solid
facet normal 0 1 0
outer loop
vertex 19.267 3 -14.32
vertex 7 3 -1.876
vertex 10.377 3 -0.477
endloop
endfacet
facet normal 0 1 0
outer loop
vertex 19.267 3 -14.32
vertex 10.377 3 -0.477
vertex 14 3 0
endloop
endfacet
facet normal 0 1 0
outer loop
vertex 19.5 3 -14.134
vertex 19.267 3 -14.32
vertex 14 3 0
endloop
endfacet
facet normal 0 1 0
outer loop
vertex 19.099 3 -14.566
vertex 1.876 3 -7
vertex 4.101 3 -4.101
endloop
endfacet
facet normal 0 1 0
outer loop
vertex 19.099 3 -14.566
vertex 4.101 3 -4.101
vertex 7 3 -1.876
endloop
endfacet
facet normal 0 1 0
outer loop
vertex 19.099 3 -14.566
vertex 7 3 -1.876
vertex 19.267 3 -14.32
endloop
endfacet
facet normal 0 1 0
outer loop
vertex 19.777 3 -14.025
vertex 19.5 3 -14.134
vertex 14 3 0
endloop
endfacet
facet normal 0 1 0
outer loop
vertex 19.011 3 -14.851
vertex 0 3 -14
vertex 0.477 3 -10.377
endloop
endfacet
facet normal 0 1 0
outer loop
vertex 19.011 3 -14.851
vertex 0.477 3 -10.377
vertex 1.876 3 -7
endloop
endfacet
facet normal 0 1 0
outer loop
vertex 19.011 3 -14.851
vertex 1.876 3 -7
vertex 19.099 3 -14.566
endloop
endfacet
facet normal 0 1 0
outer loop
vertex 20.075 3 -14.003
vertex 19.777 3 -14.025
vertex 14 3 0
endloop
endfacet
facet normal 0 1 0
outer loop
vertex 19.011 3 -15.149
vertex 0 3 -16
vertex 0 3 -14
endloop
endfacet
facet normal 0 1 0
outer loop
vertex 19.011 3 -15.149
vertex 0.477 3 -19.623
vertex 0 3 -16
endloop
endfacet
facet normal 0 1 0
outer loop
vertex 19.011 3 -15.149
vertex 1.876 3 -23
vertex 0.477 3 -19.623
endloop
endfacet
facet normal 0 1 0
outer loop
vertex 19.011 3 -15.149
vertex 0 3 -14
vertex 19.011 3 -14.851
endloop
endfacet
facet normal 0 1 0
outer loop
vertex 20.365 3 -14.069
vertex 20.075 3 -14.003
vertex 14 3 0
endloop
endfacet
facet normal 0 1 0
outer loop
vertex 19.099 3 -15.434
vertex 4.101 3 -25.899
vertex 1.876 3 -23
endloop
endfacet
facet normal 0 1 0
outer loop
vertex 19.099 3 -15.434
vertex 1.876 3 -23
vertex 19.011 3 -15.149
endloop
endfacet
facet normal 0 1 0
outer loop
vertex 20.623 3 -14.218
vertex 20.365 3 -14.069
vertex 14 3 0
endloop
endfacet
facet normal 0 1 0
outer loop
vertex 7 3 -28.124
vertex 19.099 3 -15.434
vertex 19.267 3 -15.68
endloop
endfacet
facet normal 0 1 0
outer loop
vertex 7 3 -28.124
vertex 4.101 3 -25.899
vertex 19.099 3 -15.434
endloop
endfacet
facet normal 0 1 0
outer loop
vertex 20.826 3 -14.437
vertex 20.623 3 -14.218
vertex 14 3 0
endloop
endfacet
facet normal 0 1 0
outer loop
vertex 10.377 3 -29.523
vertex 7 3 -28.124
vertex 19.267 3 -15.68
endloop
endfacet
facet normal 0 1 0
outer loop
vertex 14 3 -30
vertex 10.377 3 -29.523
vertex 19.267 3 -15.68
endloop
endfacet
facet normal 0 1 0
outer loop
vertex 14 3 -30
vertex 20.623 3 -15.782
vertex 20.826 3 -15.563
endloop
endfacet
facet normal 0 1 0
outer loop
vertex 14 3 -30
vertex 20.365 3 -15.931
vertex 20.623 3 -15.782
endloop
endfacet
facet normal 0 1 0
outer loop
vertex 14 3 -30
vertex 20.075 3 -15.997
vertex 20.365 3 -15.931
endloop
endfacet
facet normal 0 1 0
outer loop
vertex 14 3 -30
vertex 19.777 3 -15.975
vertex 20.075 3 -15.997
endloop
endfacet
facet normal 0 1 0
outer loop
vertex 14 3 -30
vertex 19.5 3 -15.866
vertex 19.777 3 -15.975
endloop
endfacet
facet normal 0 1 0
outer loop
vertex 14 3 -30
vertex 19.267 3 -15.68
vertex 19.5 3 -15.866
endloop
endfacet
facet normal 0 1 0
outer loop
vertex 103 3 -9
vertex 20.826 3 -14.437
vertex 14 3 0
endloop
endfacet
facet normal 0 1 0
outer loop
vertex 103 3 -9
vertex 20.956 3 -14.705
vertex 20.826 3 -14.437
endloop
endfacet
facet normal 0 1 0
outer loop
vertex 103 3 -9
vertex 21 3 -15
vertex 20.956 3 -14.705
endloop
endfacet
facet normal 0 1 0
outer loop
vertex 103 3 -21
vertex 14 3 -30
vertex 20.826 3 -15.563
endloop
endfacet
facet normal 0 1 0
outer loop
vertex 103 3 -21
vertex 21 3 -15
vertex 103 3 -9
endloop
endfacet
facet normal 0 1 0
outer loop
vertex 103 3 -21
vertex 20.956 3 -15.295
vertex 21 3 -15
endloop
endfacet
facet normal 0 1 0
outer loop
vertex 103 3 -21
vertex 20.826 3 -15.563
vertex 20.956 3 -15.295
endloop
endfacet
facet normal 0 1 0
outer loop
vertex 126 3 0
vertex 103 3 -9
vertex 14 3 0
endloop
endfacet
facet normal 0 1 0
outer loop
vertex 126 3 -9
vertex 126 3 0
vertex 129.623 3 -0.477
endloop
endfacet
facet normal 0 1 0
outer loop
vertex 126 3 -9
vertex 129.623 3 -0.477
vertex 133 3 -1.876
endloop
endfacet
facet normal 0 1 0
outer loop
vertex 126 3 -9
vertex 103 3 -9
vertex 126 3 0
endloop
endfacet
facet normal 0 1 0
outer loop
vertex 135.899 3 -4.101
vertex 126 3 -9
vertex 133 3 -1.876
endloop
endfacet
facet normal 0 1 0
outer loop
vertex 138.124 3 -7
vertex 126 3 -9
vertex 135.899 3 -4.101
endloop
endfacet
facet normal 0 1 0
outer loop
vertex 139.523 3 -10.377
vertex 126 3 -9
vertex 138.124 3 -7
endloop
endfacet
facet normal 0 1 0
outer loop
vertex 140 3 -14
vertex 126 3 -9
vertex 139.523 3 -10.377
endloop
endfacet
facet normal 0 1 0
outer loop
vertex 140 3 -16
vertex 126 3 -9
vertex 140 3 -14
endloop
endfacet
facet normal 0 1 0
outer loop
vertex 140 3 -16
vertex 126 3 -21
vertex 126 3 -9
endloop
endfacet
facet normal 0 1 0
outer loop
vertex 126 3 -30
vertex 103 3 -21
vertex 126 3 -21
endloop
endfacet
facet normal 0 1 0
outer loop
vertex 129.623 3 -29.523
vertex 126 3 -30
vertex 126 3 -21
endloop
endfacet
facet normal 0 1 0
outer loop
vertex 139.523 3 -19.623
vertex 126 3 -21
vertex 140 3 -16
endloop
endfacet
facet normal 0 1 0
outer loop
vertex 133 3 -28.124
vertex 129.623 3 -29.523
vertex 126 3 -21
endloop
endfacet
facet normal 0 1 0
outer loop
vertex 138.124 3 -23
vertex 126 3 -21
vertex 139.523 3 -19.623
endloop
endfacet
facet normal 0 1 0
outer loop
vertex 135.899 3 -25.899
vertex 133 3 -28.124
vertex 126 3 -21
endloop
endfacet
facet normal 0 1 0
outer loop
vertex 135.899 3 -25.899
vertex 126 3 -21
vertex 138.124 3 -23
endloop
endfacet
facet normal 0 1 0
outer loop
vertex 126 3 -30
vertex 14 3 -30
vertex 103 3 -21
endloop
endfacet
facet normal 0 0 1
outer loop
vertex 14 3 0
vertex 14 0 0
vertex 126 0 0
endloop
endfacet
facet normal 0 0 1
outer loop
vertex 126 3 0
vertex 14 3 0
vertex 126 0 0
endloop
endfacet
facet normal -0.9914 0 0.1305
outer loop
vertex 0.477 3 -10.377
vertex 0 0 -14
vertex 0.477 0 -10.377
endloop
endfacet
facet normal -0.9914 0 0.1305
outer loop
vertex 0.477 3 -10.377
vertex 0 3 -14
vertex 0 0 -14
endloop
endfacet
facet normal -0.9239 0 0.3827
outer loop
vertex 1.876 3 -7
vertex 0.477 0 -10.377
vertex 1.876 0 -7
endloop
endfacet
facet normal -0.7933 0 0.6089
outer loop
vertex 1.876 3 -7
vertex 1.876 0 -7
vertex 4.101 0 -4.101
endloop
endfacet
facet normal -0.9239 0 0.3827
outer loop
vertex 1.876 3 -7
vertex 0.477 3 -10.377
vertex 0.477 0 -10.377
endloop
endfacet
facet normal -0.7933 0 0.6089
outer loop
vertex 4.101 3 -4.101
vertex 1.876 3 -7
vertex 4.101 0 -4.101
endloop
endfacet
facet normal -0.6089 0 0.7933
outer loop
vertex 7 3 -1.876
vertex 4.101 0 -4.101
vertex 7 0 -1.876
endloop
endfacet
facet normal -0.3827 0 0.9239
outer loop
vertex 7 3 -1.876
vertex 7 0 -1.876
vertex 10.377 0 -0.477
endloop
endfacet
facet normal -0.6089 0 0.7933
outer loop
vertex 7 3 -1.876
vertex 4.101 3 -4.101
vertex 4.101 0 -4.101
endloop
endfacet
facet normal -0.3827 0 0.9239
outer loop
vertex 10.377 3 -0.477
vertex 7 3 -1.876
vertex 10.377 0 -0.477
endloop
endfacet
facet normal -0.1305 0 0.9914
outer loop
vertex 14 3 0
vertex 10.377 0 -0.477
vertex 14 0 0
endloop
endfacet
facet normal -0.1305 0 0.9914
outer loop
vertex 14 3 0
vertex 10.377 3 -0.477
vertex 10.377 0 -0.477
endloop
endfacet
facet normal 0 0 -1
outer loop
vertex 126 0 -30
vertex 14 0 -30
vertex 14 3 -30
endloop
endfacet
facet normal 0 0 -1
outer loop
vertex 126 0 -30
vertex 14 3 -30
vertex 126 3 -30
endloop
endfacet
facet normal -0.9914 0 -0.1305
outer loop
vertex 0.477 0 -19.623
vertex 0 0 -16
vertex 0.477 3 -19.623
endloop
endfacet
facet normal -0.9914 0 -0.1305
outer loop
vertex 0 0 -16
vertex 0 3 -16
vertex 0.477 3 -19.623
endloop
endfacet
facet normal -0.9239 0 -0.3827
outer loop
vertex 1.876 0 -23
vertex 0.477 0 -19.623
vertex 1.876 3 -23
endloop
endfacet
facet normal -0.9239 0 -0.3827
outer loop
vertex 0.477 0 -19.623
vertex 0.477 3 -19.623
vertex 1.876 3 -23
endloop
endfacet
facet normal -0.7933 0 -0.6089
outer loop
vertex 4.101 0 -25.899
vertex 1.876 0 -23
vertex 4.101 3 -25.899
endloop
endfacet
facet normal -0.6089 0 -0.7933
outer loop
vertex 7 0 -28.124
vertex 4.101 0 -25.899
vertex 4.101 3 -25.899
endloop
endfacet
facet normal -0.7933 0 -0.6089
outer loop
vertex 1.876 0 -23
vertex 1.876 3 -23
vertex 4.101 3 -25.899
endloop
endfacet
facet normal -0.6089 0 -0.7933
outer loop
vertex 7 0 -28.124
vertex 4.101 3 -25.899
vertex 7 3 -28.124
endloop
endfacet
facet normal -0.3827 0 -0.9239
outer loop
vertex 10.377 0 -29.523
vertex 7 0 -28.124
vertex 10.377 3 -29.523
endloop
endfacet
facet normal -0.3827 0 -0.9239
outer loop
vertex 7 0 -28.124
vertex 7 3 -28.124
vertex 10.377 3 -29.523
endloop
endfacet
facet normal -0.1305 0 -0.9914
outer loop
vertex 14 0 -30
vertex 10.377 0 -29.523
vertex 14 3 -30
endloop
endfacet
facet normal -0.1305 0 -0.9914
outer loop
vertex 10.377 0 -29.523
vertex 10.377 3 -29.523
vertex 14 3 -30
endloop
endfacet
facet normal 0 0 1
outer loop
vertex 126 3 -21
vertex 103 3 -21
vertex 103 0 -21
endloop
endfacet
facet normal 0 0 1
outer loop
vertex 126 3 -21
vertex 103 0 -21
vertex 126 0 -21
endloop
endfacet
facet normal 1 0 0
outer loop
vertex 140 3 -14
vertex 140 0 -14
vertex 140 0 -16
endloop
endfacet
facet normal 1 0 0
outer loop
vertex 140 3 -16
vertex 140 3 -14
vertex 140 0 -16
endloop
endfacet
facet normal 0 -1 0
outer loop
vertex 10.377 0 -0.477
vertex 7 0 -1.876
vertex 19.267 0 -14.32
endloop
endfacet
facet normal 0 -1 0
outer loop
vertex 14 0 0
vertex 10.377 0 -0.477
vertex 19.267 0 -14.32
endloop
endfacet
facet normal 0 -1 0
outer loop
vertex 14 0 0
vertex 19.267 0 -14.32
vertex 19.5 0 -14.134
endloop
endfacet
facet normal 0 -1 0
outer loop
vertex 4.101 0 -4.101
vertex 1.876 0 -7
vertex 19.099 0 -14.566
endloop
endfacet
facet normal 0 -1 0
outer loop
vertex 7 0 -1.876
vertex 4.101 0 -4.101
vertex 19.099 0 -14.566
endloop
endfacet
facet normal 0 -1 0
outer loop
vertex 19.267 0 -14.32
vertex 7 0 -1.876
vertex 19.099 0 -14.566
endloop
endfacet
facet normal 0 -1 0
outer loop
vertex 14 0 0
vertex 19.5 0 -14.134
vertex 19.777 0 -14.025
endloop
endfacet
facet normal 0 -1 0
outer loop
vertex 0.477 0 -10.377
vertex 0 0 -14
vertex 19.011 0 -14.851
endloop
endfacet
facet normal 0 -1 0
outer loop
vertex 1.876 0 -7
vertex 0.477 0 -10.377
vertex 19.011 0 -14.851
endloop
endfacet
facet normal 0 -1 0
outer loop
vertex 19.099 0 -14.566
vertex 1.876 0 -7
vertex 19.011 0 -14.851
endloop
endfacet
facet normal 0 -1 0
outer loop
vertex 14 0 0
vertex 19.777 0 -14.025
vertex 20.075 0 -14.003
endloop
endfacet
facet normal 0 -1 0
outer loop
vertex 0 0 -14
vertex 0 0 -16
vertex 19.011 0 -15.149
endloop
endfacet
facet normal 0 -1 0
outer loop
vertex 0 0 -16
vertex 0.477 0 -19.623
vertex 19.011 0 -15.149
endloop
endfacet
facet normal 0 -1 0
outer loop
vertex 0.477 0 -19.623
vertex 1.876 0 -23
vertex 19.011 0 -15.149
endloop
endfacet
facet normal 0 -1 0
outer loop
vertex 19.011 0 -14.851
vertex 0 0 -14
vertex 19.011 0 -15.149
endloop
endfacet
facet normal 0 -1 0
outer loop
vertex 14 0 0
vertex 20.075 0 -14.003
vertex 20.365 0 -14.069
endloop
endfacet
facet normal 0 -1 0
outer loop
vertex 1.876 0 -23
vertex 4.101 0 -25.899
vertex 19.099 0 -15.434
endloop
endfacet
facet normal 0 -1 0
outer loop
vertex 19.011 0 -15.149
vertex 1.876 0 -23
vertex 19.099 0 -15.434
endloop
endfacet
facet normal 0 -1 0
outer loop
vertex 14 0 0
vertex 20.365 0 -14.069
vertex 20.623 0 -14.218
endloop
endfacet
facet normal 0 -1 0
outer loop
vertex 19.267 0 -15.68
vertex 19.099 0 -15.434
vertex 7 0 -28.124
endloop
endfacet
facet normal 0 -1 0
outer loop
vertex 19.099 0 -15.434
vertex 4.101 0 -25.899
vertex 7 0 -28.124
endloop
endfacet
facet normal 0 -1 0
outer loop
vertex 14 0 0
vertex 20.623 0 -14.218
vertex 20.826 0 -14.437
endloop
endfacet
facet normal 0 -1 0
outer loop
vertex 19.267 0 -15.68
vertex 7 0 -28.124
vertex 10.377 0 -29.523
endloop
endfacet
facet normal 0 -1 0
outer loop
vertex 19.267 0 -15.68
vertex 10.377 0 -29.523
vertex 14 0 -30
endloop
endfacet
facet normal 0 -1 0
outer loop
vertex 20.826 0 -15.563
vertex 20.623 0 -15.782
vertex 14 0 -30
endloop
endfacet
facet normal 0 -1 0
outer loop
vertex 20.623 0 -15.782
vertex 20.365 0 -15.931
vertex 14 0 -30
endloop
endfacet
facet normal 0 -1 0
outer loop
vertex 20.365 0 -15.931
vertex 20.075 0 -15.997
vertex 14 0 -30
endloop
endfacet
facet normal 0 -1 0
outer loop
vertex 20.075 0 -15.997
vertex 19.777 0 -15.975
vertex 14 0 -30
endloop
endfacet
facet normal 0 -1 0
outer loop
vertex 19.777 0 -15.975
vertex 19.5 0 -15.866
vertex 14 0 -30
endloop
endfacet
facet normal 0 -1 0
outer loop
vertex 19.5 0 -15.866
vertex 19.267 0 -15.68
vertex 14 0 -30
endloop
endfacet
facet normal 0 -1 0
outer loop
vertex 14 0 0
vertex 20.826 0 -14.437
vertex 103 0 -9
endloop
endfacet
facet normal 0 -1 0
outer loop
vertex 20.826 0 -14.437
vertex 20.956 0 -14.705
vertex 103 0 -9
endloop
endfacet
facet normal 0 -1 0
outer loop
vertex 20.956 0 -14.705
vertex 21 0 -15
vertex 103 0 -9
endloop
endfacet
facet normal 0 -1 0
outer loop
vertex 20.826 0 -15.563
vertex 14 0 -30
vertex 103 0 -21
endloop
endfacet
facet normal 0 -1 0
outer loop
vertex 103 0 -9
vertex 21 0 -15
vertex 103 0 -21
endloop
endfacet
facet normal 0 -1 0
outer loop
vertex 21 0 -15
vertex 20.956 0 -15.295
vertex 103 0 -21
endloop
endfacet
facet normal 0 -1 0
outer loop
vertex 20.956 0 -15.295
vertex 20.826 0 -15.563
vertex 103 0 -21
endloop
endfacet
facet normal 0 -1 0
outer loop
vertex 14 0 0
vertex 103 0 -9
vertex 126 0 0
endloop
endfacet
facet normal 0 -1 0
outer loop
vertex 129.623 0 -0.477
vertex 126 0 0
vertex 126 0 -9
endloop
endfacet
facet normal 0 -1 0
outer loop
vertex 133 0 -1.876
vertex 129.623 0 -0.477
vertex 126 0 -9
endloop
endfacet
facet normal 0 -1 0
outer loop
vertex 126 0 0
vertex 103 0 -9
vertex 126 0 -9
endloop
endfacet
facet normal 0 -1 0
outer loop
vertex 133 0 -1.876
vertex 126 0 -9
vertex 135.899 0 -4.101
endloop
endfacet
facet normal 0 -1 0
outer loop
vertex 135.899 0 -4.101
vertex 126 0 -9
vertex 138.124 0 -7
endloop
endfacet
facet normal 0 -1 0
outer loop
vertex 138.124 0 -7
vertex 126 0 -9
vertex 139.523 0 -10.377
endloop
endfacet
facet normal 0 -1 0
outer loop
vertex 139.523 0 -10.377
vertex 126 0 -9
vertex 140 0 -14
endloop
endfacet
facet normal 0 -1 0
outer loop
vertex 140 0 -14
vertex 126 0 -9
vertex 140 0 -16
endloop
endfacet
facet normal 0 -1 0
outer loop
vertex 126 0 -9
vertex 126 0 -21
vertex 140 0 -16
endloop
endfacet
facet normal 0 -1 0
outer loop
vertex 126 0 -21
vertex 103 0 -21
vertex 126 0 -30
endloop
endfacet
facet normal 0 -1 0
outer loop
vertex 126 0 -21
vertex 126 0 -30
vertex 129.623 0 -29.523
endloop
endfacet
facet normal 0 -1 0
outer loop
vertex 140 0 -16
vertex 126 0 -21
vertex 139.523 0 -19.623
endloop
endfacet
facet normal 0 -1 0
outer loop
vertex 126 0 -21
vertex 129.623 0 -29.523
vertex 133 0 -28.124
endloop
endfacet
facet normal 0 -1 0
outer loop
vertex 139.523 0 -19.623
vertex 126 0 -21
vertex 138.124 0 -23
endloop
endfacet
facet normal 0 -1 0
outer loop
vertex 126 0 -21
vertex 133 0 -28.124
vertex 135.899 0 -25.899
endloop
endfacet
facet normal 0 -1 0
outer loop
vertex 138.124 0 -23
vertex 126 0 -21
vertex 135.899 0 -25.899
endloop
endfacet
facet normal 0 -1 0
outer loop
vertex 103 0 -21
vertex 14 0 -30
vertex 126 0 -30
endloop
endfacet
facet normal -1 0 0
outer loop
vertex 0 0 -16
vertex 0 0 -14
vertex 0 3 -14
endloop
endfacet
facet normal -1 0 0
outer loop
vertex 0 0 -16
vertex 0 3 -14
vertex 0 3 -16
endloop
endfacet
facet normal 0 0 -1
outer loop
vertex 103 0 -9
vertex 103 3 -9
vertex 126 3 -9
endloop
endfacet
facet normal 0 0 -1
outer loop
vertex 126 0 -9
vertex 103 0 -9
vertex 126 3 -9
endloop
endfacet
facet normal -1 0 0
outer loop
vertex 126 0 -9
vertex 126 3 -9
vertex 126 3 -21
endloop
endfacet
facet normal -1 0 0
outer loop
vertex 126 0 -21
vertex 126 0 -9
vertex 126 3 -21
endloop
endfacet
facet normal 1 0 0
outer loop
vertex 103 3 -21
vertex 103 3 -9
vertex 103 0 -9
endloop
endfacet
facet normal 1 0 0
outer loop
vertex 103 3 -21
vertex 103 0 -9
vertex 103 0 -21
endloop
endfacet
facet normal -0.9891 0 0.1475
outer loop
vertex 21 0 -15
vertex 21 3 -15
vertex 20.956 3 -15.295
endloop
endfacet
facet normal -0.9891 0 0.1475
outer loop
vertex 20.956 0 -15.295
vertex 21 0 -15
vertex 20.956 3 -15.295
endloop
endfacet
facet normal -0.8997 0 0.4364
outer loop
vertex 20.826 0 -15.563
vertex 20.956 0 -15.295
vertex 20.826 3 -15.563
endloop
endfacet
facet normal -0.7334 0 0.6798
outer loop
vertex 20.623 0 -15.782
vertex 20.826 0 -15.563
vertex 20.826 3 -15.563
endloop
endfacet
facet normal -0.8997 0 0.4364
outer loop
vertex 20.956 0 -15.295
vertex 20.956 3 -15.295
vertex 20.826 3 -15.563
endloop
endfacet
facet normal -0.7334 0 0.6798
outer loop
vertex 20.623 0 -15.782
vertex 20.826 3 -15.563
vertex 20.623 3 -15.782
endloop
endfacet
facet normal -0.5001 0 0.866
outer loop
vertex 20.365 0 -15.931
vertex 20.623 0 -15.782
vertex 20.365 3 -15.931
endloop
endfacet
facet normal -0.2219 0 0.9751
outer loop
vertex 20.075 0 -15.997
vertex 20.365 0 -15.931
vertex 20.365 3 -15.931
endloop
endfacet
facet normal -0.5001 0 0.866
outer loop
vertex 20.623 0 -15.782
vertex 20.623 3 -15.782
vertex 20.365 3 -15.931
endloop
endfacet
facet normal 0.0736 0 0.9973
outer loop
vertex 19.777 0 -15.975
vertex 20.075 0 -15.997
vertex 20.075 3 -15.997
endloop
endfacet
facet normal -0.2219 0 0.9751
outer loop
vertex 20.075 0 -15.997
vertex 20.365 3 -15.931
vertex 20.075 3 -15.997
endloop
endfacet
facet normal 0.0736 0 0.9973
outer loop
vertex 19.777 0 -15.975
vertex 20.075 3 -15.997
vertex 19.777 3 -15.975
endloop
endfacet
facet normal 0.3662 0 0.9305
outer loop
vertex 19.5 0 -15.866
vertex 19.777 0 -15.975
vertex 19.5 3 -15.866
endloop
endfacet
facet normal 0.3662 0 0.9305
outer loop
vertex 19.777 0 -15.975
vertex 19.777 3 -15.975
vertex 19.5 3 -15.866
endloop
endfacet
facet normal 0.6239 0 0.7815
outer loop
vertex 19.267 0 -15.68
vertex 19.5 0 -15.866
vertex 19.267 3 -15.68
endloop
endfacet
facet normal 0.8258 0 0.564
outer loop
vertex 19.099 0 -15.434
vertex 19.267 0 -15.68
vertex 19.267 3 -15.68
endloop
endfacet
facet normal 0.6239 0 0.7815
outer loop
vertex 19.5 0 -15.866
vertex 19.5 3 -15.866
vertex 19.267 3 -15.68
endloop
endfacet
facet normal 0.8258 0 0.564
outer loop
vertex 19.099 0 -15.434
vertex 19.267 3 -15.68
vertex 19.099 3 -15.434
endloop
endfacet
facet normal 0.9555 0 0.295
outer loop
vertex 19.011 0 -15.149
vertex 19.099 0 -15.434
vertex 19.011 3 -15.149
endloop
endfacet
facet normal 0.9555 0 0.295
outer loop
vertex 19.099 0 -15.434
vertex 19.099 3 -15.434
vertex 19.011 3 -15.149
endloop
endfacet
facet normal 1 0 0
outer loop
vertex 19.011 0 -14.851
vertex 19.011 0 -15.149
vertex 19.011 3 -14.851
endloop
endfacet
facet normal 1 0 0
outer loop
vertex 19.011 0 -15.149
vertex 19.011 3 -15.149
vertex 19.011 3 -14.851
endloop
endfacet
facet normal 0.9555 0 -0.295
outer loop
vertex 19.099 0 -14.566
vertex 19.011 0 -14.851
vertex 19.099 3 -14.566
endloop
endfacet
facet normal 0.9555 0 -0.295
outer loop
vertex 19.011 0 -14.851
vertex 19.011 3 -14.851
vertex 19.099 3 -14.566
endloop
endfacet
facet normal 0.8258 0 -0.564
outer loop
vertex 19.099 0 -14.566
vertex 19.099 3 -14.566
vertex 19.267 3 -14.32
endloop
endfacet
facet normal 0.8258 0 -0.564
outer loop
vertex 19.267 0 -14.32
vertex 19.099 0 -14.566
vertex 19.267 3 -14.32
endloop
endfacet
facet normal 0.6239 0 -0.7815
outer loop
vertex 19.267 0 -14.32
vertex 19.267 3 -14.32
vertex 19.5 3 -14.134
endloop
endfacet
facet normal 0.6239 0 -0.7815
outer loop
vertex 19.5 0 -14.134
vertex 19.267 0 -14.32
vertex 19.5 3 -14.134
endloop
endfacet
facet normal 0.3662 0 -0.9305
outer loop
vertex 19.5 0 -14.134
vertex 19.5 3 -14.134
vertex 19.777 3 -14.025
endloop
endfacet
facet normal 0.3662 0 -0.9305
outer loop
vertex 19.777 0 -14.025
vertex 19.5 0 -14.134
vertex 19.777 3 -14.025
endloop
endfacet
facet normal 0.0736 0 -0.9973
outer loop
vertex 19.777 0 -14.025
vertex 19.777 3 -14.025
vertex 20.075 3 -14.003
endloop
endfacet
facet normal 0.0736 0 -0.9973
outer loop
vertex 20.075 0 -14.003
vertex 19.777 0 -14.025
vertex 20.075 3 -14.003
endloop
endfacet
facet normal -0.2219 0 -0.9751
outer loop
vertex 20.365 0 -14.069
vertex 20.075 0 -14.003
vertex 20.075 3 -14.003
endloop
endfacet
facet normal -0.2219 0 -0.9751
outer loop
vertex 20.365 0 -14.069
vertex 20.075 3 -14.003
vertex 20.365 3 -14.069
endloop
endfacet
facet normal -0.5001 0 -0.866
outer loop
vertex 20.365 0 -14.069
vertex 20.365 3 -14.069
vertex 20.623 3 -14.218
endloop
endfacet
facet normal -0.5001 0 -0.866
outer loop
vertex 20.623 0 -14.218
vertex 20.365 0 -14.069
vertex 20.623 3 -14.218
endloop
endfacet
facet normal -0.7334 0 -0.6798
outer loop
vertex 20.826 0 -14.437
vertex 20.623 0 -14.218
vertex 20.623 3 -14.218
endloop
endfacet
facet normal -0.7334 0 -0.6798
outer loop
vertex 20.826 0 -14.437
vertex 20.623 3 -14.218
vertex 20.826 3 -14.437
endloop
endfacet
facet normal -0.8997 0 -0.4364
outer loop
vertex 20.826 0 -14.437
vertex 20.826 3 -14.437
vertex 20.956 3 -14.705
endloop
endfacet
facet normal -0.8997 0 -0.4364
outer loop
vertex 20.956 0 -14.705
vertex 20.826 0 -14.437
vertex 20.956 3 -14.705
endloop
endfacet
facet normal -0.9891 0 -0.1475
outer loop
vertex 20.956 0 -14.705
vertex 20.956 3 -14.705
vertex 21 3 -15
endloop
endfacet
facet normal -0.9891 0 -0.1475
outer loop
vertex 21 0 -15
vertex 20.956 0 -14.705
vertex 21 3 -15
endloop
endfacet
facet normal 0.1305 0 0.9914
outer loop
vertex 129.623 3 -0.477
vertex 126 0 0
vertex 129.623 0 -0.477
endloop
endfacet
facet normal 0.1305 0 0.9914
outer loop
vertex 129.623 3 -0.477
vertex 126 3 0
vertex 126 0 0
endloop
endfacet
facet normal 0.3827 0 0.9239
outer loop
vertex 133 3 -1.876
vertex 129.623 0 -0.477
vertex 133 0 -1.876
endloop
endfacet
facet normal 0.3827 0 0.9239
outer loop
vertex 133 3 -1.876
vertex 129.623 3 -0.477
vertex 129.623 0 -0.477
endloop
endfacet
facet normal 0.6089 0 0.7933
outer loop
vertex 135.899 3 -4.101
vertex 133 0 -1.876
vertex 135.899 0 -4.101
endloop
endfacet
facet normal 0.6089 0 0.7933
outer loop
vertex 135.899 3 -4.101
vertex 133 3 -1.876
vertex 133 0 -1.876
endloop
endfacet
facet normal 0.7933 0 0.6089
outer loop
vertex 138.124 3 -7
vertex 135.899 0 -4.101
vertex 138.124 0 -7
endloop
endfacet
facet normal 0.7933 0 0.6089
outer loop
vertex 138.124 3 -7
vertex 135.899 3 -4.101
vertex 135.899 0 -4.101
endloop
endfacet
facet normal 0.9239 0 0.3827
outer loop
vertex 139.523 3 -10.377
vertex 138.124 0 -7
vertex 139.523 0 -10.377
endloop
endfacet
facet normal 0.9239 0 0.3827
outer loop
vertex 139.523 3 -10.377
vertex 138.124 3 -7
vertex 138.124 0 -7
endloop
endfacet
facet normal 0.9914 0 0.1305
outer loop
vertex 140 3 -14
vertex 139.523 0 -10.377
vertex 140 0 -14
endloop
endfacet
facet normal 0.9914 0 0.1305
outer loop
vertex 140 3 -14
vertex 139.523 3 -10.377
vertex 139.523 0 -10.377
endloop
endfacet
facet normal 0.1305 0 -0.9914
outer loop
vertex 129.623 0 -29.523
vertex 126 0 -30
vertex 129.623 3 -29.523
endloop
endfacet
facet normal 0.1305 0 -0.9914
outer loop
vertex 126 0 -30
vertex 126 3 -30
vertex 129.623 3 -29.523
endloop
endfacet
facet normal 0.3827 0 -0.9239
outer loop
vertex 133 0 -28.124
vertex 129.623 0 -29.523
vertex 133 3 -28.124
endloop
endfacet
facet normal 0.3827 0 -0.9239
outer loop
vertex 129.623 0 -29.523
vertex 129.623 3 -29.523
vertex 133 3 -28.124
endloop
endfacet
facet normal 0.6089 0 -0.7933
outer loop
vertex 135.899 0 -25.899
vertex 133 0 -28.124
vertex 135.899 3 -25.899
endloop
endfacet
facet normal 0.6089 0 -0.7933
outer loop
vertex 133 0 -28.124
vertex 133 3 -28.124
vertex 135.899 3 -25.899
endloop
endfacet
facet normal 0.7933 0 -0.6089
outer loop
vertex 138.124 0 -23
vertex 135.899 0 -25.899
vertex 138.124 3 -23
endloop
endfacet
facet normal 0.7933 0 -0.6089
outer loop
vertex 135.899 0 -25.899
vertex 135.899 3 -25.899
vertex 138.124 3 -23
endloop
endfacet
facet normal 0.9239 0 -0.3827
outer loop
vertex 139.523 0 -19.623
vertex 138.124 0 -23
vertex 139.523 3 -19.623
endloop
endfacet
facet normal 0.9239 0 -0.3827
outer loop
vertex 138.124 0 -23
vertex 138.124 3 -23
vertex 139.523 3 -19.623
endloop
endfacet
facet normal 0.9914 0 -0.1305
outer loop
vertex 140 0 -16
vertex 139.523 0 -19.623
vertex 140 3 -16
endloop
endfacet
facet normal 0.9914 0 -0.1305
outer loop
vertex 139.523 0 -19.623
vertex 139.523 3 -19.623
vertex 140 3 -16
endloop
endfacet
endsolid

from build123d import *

# Parameters (mm, degrees)
SKETCH1_W           = 140
SKETCH1_H           = 30
BOSS_EXTRUDE1_DEPTH = 3
SKETCH2_R           = 1
SKETCH2_W           = 23
SKETCH2_H           = 12
CUT_EXTRUDE1_DEPTH  = 4
FILLET1_R           = 14


with BuildPart() as part:
    # Sketch1 → Boss-Extrude1 (new body)
    with BuildSketch(Plane(origin=(0, 0, 0), x_dir=(1, 0, 0), z_dir=(0, 1, 0))):
        with Locations((70, 15)):
            Rectangle(SKETCH1_W, SKETCH1_H)
    extrude(amount=BOSS_EXTRUDE1_DEPTH)

    # Sketch2 → Cut-Extrude1 (cut, through all)
    with BuildSketch(Plane(origin=(0, 3, 0), x_dir=(1, 0, 0), z_dir=(0, 1, 0))):
        with Locations((20, 15)):
            Circle(SKETCH2_R)
        with Locations((114.5, 15)):
            Rectangle(SKETCH2_W, SKETCH2_H)
    extrude(amount=-CUT_EXTRUDE1_DEPTH, mode=Mode.SUBTRACT)

    # Fillet1
    fillet1_edges = [part.edges().sort_by_distance(p)[0] for p in [
        (0, 1.5, -30),
        (140, 1.5, -30),
        (140, 1.5, 0),
        (0, 1.5, 0),
    ]]
    fillet(fillet1_edges, radius=FILLET1_R)


solid = part.part
